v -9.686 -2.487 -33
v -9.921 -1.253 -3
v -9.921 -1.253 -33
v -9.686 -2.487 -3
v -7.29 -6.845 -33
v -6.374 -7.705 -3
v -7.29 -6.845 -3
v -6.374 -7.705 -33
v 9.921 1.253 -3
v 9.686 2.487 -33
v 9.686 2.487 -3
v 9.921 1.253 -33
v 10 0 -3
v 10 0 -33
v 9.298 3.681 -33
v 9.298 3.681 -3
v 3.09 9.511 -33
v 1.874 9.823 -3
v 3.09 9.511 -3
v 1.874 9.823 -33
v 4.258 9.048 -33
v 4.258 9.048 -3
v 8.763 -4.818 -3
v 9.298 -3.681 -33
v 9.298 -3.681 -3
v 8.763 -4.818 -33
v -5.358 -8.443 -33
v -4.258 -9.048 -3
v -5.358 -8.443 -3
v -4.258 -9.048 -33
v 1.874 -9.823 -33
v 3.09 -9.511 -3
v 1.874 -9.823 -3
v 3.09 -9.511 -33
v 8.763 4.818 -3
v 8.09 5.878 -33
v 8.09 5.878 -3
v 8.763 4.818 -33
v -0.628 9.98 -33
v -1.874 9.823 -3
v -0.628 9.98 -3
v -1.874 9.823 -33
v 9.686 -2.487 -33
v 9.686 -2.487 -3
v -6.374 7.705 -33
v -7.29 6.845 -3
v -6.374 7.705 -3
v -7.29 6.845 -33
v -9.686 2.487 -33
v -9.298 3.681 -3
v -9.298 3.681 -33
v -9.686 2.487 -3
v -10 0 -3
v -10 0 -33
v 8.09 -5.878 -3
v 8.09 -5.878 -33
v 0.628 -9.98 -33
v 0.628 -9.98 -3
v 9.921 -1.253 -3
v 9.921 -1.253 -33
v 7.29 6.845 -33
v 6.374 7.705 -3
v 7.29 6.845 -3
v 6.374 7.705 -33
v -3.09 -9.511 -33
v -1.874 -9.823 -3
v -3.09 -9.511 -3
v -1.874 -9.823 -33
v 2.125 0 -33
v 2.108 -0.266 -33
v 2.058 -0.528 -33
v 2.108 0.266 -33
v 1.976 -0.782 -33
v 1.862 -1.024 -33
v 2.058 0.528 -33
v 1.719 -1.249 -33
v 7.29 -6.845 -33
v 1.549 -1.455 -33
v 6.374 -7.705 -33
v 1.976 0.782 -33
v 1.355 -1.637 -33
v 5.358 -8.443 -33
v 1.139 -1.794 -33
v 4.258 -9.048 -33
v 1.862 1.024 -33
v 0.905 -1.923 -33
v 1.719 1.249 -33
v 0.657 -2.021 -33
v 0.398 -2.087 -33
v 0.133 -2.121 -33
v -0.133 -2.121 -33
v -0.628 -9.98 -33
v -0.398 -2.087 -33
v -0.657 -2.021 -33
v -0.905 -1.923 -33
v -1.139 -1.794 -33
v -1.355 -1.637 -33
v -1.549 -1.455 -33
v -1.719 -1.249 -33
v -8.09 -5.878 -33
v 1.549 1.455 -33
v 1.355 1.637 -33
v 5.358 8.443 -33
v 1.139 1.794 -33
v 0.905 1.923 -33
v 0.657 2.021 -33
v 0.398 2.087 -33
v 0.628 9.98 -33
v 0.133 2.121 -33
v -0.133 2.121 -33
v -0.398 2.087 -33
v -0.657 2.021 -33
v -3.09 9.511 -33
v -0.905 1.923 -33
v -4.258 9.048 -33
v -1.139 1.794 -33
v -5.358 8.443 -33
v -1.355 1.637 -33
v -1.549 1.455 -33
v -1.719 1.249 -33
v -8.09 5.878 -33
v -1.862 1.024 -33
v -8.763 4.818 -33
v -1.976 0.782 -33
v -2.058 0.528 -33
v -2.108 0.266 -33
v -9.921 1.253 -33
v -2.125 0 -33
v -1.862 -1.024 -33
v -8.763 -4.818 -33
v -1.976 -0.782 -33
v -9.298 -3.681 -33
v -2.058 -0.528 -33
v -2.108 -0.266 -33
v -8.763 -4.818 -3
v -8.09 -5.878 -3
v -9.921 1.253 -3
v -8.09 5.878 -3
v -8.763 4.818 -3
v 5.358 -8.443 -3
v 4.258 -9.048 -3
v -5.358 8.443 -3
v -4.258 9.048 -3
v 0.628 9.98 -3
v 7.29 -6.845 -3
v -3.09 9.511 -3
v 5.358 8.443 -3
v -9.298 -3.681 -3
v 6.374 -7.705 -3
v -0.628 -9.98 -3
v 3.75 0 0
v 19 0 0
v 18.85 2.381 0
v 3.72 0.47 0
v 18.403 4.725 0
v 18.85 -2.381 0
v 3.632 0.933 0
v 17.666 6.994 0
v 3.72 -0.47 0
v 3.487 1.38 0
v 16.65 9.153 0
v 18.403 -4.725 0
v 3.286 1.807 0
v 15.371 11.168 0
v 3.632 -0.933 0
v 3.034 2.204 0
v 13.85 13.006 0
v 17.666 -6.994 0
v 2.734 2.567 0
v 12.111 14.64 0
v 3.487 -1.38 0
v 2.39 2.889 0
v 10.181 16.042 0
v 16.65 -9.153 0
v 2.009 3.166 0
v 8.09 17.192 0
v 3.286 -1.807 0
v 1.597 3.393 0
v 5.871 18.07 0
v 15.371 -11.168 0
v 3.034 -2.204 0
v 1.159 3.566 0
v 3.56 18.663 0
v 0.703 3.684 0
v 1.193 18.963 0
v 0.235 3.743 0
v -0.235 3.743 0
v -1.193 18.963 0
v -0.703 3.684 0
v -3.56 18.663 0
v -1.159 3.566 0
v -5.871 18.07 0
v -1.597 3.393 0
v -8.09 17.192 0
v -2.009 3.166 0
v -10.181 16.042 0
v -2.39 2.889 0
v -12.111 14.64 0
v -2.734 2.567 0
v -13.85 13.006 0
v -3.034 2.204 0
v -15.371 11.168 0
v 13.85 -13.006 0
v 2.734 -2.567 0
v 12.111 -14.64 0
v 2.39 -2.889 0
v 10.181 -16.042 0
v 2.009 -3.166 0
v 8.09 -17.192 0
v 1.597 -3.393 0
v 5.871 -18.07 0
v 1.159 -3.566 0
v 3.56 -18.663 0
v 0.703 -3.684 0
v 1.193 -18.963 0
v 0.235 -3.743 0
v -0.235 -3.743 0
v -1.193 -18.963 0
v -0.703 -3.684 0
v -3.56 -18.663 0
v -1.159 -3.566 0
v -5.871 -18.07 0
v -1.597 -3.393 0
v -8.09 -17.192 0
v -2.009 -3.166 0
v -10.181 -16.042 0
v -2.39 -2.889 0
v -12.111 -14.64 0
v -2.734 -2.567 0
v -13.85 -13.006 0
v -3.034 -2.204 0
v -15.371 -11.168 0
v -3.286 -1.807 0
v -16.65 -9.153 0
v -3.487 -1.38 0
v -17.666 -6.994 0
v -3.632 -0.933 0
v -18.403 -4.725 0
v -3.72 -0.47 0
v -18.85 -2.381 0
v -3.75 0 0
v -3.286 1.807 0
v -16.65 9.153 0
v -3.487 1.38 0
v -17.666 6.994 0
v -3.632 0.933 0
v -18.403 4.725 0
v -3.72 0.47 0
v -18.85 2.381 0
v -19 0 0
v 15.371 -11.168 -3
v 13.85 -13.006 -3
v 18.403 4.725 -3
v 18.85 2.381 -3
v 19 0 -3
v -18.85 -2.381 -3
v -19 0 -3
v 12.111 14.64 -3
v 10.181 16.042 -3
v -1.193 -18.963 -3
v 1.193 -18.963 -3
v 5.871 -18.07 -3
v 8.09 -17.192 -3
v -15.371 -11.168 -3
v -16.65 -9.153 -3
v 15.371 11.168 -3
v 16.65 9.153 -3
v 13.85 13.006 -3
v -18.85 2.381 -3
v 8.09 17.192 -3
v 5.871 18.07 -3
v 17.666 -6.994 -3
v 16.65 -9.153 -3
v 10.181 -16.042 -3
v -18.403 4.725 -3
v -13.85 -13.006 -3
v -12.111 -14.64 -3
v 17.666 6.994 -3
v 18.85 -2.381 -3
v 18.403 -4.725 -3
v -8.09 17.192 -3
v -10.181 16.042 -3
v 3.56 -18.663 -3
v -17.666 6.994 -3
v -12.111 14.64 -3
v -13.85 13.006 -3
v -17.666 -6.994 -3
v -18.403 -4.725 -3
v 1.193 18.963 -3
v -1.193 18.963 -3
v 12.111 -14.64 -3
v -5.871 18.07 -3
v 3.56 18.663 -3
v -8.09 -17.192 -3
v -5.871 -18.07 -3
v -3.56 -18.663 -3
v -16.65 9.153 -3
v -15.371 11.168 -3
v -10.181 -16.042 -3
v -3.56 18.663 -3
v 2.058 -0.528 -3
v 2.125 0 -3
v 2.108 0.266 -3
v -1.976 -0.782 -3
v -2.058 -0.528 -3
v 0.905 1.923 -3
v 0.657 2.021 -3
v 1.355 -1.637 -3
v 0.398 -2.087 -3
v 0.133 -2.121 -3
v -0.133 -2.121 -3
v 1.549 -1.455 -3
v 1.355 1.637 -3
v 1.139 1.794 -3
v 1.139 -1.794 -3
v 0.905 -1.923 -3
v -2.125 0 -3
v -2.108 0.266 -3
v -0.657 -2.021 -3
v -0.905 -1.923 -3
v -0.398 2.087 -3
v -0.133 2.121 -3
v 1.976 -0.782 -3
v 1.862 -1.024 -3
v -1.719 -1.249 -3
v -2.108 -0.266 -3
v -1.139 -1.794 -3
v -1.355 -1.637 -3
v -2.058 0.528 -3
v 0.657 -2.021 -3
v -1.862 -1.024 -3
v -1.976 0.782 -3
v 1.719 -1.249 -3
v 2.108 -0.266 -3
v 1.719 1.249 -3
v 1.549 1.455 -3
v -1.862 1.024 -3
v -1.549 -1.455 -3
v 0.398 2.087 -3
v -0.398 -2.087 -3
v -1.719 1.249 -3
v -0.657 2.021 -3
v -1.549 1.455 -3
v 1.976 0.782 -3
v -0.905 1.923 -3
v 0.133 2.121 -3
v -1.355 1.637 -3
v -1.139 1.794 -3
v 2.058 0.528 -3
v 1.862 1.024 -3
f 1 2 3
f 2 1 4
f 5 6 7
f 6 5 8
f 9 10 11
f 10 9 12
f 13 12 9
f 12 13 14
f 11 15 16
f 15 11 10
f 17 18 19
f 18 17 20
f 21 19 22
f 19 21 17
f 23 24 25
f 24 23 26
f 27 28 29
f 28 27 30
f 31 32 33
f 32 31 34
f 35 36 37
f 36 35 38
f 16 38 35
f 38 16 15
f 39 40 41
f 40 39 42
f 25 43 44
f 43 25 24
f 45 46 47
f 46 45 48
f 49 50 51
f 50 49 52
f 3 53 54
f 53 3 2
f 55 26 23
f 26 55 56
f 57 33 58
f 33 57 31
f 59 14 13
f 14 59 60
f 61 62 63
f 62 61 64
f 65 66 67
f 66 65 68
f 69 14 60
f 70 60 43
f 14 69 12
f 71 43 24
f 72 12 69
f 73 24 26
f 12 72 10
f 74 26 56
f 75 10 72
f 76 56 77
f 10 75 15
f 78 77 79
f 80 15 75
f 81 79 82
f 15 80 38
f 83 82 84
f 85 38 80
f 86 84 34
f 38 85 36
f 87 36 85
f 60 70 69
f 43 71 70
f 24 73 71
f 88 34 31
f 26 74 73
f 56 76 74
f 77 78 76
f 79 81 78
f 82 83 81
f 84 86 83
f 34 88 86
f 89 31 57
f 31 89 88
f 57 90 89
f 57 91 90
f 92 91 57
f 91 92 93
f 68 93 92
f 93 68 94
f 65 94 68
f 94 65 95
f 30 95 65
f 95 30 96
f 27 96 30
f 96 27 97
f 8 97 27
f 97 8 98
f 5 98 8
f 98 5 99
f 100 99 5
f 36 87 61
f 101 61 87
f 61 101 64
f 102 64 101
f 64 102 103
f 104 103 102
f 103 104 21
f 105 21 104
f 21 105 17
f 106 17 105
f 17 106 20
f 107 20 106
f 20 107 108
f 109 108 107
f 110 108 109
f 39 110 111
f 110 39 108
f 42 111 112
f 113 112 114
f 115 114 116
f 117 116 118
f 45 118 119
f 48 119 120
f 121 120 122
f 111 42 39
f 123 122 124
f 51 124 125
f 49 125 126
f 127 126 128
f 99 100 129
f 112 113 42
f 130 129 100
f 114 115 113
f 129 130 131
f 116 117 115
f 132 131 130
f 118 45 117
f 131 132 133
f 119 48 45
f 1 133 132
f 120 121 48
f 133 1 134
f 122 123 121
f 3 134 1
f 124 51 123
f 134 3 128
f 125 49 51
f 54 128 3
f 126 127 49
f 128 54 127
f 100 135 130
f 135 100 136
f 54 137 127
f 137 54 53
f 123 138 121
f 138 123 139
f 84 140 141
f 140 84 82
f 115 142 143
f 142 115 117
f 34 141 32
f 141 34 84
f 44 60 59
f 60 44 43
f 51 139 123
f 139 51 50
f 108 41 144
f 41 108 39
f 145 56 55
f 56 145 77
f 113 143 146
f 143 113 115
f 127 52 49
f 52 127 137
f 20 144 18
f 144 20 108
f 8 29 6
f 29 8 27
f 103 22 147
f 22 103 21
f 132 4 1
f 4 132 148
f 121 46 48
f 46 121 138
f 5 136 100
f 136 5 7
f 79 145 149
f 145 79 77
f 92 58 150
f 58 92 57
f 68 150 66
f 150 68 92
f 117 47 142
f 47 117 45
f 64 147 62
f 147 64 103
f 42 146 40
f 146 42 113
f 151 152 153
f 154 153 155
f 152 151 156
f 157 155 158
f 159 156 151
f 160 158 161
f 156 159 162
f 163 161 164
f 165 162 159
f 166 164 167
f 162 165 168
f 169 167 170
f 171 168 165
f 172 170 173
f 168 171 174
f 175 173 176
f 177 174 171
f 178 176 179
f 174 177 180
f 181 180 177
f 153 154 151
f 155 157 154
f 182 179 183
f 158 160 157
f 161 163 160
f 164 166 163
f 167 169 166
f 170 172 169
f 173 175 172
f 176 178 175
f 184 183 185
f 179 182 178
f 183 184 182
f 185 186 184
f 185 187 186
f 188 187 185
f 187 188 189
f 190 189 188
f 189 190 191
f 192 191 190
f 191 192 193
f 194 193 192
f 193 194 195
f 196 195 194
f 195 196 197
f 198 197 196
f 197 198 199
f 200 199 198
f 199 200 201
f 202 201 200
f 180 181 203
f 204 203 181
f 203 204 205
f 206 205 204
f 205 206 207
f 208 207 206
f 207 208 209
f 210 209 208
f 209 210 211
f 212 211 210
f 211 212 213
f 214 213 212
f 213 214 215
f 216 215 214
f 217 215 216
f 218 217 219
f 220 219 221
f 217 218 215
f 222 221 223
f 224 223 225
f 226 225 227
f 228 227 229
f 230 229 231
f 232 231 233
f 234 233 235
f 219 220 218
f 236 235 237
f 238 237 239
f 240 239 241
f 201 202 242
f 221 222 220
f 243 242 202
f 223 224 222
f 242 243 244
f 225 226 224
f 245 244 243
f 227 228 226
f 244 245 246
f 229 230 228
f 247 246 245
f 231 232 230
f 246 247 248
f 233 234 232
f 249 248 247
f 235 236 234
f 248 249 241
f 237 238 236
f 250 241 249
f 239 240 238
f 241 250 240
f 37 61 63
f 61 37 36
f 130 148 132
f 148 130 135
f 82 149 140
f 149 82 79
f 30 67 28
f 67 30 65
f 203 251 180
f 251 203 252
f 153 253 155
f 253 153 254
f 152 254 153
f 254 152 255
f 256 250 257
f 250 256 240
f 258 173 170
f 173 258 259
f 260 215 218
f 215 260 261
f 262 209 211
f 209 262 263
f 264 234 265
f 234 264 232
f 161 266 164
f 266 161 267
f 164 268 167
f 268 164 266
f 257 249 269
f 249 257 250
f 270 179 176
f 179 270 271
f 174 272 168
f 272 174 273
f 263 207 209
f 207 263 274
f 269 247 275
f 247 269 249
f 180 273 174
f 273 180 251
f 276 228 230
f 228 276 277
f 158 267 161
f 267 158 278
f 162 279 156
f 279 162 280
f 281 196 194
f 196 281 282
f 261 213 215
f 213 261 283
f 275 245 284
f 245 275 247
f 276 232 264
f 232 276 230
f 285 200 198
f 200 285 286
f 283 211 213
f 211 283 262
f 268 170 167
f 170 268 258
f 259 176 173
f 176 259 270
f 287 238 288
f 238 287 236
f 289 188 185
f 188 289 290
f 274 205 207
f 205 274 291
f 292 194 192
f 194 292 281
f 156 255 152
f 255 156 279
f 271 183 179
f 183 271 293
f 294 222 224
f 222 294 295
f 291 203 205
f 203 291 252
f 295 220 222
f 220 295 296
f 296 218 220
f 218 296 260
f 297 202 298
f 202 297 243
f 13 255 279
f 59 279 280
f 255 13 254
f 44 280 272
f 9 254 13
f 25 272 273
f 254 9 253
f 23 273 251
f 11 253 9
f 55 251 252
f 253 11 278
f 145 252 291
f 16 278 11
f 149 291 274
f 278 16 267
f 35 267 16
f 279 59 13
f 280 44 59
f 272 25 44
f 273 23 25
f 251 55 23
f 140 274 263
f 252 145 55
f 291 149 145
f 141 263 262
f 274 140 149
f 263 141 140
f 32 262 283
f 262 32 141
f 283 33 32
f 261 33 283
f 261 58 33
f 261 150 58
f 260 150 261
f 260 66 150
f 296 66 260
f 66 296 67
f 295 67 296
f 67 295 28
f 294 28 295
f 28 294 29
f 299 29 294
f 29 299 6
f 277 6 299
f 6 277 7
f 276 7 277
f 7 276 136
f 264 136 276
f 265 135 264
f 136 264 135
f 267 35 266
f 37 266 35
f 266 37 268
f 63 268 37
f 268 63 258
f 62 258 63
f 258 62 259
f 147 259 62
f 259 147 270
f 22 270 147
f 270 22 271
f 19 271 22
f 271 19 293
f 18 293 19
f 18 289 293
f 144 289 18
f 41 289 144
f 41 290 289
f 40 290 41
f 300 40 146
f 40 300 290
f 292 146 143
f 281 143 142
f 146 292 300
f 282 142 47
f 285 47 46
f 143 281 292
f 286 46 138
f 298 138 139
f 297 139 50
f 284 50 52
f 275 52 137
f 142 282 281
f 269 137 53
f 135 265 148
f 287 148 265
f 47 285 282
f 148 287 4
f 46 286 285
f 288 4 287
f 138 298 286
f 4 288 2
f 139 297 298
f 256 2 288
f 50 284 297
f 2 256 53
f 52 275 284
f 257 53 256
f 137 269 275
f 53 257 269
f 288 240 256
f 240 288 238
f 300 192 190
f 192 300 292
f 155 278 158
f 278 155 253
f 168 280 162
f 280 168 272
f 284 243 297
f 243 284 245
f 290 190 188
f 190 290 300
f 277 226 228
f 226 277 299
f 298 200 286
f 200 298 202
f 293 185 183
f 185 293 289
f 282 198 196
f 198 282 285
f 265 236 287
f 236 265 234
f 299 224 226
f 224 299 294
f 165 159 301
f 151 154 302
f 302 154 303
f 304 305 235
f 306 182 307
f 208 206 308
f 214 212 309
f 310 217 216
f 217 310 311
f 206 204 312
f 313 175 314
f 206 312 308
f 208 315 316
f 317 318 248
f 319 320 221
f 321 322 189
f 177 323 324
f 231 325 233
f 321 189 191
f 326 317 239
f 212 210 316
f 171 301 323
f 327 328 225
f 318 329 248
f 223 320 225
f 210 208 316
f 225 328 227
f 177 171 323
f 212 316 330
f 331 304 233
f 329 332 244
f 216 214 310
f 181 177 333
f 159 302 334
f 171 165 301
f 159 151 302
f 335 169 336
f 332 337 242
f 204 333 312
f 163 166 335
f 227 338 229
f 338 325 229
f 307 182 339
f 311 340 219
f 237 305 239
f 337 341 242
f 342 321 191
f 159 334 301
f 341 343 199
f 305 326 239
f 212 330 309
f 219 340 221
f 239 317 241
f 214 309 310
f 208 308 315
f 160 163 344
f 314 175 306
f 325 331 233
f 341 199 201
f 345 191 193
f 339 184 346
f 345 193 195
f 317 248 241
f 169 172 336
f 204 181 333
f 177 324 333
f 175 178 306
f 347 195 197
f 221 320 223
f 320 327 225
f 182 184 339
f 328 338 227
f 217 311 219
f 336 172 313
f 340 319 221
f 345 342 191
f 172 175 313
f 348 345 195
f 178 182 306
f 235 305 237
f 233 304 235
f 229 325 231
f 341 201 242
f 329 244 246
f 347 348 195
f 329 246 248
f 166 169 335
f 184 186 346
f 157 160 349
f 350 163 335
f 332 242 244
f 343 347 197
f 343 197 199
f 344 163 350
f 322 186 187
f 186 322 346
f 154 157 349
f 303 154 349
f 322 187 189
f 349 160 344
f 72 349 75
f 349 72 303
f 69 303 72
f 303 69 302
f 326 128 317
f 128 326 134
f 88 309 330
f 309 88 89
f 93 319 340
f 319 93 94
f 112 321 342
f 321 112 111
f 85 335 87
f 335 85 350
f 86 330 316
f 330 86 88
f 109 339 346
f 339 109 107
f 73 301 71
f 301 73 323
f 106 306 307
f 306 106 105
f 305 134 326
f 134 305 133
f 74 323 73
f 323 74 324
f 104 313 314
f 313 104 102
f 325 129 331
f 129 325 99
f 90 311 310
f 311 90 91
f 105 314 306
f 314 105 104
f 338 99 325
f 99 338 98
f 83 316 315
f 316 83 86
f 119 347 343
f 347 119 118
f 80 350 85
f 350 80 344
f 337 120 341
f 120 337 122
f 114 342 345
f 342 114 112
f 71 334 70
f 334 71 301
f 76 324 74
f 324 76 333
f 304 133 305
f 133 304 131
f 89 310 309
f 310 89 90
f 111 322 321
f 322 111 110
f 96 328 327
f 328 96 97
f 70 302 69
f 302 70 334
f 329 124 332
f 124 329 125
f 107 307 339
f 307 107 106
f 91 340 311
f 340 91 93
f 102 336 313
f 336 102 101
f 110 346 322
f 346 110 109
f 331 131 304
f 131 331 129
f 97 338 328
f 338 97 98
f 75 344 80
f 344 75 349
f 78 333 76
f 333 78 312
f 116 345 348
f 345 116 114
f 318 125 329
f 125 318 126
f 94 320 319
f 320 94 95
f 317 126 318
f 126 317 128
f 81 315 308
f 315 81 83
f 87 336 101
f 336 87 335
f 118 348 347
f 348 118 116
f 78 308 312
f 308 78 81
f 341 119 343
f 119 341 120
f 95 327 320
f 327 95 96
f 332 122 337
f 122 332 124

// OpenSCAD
$fn = 50;


difference() {
	union() {
		translate(v = [0, 0, -33.0000000000]) {
			cylinder(h = 33, r = 10.0000000000);
		}
		translate(v = [0, 0, -3.0000000000]) {
			cylinder(h = 3, r = 19.0000000000);
		}
	}
	union() {
		translate(v = [0, 0, 0]) {
			rotate(a = [0, 0, 0]) {
				difference() {
					union() {
						#translate(v = [0, 0, -33.0000000000]) {
							cylinder(h = 33, r = 2.0000000000);
						}
						#translate(v = [0, 0, -3]) {
							cylinder(h = 3, r = 10.0000000000, r1 = 2.1250000000, r2 = 3.7500000000);
						}
						#translate(v = [0, 0, -33.0000000000]) {
							cylinder(h = 33, r = 2.1250000000);
						}
						#translate(v = [0, 0, -33.0000000000]) {
							cylinder(h = 33, r = 2.0000000000);
						}
					}
					union();
				}
			}
		}
	}
}
